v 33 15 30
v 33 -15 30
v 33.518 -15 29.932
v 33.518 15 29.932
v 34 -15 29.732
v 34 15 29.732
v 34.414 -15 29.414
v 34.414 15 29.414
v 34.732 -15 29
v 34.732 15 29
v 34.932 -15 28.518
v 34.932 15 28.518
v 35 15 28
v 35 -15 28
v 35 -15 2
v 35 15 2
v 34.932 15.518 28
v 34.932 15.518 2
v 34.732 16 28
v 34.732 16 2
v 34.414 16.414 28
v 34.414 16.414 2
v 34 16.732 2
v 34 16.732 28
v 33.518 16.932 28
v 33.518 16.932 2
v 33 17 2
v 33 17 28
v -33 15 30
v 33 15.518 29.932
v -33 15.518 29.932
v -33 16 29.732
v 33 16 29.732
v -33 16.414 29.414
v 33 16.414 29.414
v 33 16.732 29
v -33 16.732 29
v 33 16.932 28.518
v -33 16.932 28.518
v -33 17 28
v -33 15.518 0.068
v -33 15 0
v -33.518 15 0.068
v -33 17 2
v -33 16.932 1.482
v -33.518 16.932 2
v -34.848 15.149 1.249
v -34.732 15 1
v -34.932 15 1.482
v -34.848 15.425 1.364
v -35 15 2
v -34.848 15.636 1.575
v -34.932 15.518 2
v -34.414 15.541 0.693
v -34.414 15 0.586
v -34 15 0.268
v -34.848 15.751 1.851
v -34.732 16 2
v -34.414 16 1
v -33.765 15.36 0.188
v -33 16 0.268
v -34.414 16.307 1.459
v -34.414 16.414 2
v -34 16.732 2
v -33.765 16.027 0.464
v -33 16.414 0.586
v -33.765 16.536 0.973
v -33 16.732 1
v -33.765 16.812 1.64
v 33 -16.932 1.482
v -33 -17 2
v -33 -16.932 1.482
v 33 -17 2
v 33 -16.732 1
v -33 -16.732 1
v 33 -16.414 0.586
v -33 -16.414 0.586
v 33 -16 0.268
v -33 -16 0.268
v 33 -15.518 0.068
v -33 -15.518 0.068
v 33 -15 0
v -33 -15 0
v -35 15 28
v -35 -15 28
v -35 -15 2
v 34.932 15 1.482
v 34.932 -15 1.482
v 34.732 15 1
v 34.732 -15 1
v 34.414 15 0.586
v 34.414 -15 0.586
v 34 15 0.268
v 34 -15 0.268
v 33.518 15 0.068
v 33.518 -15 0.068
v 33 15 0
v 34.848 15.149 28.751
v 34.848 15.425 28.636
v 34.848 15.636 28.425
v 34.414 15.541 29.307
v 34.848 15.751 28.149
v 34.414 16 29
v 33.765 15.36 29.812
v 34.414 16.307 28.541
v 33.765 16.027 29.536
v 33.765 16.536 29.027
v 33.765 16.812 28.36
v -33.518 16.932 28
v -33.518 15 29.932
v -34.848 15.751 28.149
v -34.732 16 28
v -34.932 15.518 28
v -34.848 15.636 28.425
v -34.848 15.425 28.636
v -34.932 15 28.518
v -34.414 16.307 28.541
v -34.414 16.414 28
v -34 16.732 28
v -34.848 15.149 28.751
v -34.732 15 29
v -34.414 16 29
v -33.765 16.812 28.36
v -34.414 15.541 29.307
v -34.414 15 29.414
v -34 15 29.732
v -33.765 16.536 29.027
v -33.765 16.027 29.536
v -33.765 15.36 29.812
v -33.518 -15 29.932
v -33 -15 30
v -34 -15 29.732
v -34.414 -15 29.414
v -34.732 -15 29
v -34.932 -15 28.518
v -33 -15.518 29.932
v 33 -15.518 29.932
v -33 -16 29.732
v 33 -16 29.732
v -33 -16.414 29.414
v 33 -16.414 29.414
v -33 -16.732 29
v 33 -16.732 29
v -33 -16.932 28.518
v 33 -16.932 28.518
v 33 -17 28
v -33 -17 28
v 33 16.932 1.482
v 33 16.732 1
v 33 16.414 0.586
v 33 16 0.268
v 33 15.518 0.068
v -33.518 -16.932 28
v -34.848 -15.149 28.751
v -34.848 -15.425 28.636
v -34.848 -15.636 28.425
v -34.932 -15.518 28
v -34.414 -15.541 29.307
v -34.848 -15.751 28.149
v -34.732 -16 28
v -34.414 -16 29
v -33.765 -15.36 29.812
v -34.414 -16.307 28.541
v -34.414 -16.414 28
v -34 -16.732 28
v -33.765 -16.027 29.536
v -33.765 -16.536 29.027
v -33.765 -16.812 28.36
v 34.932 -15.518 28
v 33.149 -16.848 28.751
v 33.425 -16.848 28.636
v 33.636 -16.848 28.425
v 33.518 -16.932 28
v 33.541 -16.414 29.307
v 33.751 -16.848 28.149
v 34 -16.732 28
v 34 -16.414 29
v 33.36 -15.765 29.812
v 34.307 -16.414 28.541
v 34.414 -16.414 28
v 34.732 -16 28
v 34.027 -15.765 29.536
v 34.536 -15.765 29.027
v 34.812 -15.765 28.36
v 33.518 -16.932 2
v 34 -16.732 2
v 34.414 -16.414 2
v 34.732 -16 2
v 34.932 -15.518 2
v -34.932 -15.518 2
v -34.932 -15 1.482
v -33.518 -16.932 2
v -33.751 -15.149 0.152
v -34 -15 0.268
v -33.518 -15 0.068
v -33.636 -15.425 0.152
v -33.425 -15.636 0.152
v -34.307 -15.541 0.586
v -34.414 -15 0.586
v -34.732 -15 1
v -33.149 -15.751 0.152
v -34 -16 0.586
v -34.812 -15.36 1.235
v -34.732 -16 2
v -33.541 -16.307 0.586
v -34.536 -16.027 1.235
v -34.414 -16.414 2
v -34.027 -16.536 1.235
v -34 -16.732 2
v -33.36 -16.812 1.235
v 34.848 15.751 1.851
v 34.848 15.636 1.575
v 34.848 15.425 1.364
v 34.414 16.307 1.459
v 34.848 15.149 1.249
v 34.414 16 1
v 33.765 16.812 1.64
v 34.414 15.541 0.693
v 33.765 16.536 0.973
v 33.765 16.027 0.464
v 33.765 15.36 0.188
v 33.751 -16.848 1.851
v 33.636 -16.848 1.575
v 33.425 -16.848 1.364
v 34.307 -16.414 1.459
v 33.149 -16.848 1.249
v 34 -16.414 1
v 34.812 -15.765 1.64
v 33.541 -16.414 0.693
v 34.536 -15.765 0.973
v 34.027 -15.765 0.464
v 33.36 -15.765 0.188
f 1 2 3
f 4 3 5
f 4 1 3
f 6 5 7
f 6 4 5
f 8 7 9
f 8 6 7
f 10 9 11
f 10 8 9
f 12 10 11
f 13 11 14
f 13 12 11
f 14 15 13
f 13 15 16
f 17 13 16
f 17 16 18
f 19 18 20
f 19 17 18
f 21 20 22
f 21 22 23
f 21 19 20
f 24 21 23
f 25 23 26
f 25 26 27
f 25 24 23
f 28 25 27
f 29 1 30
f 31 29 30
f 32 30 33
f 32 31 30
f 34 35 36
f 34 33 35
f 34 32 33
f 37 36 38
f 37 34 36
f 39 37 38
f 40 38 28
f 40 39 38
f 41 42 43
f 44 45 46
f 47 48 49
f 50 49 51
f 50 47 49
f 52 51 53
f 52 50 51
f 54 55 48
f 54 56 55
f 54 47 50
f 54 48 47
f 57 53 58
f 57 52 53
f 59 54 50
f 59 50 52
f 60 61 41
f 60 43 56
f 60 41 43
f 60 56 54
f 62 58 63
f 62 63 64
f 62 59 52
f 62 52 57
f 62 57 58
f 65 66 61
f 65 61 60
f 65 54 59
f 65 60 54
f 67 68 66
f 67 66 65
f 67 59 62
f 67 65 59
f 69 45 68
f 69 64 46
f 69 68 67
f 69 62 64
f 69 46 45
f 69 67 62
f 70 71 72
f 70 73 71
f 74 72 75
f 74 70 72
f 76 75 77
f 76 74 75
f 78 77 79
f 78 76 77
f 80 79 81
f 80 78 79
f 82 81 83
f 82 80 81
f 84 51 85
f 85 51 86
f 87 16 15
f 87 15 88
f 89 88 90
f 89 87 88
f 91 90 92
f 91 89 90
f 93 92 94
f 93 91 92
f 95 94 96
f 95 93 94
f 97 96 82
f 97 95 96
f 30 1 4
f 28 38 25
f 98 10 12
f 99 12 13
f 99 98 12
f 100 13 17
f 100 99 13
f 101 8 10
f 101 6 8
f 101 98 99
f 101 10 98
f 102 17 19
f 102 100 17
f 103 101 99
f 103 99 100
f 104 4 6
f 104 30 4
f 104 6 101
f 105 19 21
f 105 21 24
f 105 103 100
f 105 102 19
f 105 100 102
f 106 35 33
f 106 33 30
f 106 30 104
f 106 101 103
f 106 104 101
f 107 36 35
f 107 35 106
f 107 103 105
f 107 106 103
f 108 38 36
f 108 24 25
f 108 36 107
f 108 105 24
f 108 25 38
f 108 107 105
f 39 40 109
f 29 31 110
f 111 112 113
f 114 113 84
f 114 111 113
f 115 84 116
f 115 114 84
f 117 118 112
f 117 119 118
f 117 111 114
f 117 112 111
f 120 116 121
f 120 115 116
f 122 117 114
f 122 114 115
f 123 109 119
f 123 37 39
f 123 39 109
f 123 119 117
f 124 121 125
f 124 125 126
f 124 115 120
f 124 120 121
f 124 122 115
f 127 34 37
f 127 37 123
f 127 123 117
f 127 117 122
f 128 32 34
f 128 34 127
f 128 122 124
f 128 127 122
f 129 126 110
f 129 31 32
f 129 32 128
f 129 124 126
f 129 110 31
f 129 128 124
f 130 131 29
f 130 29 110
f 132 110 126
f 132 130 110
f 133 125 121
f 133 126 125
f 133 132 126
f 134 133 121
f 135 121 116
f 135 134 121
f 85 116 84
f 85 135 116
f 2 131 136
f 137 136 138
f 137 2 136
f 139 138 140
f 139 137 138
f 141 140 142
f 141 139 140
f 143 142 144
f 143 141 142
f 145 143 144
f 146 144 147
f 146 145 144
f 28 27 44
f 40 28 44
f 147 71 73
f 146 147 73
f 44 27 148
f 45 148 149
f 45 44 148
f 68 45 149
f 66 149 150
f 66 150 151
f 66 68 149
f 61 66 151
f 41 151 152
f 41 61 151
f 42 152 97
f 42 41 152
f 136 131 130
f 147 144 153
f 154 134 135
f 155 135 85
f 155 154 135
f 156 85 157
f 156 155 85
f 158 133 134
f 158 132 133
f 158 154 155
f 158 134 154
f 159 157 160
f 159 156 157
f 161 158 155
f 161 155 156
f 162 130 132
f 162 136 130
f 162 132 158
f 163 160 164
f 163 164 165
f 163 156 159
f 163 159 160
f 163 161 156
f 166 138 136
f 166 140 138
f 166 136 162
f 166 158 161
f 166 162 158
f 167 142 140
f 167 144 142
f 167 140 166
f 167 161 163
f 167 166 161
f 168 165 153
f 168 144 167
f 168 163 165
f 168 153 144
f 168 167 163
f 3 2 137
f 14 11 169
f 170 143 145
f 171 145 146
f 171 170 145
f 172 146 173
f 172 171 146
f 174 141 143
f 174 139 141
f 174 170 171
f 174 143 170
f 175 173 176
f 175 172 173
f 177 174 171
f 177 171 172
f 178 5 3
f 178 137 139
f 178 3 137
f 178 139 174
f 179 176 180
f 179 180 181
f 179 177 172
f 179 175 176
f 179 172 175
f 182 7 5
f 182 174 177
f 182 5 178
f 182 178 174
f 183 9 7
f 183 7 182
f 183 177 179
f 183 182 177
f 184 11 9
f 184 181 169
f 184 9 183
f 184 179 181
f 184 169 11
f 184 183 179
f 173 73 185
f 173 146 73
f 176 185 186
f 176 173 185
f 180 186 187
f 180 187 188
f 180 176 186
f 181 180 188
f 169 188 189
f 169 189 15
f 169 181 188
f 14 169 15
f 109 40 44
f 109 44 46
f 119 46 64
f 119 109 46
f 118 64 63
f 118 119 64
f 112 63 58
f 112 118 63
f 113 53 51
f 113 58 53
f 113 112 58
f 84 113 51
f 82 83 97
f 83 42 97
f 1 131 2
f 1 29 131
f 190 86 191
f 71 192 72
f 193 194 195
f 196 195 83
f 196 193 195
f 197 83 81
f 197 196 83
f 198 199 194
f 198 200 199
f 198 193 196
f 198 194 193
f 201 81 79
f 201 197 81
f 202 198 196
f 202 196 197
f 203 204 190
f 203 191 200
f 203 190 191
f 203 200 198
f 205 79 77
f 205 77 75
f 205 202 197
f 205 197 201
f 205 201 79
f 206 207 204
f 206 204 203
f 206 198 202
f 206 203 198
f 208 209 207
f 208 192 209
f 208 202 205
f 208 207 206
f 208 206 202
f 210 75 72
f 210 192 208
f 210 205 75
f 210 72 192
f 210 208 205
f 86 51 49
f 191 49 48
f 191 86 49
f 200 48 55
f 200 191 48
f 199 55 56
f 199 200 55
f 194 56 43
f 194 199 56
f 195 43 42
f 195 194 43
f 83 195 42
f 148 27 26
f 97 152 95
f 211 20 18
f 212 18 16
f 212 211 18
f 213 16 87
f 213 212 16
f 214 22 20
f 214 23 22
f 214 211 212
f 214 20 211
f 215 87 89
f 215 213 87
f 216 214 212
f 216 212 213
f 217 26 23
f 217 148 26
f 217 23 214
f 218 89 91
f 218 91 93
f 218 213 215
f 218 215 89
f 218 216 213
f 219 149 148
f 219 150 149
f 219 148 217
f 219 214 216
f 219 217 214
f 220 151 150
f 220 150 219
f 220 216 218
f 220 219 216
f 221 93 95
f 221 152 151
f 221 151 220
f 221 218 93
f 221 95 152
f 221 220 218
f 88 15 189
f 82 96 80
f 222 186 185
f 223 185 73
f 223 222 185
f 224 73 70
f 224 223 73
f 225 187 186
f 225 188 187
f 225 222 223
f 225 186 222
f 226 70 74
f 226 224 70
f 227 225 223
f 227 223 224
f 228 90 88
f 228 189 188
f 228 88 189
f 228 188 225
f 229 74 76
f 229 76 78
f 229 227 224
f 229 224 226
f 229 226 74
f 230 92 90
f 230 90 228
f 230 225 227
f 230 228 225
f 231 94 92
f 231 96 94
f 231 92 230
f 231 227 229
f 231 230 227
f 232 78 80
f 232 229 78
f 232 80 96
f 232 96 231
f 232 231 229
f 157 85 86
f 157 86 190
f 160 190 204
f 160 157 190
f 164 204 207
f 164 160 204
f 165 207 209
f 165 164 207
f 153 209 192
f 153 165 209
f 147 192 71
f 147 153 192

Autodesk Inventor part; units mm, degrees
ref_plane "YZ Plane" through (0, 0, 0) normal (1, 0, 0) x (0, 1, 0)
ref_plane "XZ Plane" through (0, 0, 0) normal (0, 1, 0) x (-1, 0, 0)
ref_plane "XY Plane" through (0, 0, 0) normal (0, 0, 1) x (1, 0, 0)
sketch "Sketch1" plane through (0, 0, 0) normal (0, 0, 1) x (1, 0, 0)
  line L0 (0, -23.8) -> (0, 23.8) construction
  line L1 (-49, 0) -> (49, 0) construction
  line L2 (-35, -17) -> (35, -17)
  line L3 (35, -17) -> (35, 17)
  line L4 (35, 17) -> (-35, 17)
  line L5 (-35, 17) -> (-35, -17)
  line L6 (-35, -17) -> (35, 17) construction
  line L7 (35, -17) -> (-35, 17) construction
  point P0 (0, 0)
  dimension "d0" = 70
  dimension "d1" = 34
extrude "Extrusion1" add sketch "Sketch1" along normal blind 30
fillet "Fillet1" radius 2 12 edges at (0, 17, 30) (0, 17, 0) (35, 17, 15) (35, 0, 30) (35, 0, 0) (35, -17, 15) (0, -17, 30) (-35, 0, 30) (-35, -17, 15) (-35, 0, 0) (0, -17, 0) (-35, 17, 15)
properties part number "Battery Pack"
